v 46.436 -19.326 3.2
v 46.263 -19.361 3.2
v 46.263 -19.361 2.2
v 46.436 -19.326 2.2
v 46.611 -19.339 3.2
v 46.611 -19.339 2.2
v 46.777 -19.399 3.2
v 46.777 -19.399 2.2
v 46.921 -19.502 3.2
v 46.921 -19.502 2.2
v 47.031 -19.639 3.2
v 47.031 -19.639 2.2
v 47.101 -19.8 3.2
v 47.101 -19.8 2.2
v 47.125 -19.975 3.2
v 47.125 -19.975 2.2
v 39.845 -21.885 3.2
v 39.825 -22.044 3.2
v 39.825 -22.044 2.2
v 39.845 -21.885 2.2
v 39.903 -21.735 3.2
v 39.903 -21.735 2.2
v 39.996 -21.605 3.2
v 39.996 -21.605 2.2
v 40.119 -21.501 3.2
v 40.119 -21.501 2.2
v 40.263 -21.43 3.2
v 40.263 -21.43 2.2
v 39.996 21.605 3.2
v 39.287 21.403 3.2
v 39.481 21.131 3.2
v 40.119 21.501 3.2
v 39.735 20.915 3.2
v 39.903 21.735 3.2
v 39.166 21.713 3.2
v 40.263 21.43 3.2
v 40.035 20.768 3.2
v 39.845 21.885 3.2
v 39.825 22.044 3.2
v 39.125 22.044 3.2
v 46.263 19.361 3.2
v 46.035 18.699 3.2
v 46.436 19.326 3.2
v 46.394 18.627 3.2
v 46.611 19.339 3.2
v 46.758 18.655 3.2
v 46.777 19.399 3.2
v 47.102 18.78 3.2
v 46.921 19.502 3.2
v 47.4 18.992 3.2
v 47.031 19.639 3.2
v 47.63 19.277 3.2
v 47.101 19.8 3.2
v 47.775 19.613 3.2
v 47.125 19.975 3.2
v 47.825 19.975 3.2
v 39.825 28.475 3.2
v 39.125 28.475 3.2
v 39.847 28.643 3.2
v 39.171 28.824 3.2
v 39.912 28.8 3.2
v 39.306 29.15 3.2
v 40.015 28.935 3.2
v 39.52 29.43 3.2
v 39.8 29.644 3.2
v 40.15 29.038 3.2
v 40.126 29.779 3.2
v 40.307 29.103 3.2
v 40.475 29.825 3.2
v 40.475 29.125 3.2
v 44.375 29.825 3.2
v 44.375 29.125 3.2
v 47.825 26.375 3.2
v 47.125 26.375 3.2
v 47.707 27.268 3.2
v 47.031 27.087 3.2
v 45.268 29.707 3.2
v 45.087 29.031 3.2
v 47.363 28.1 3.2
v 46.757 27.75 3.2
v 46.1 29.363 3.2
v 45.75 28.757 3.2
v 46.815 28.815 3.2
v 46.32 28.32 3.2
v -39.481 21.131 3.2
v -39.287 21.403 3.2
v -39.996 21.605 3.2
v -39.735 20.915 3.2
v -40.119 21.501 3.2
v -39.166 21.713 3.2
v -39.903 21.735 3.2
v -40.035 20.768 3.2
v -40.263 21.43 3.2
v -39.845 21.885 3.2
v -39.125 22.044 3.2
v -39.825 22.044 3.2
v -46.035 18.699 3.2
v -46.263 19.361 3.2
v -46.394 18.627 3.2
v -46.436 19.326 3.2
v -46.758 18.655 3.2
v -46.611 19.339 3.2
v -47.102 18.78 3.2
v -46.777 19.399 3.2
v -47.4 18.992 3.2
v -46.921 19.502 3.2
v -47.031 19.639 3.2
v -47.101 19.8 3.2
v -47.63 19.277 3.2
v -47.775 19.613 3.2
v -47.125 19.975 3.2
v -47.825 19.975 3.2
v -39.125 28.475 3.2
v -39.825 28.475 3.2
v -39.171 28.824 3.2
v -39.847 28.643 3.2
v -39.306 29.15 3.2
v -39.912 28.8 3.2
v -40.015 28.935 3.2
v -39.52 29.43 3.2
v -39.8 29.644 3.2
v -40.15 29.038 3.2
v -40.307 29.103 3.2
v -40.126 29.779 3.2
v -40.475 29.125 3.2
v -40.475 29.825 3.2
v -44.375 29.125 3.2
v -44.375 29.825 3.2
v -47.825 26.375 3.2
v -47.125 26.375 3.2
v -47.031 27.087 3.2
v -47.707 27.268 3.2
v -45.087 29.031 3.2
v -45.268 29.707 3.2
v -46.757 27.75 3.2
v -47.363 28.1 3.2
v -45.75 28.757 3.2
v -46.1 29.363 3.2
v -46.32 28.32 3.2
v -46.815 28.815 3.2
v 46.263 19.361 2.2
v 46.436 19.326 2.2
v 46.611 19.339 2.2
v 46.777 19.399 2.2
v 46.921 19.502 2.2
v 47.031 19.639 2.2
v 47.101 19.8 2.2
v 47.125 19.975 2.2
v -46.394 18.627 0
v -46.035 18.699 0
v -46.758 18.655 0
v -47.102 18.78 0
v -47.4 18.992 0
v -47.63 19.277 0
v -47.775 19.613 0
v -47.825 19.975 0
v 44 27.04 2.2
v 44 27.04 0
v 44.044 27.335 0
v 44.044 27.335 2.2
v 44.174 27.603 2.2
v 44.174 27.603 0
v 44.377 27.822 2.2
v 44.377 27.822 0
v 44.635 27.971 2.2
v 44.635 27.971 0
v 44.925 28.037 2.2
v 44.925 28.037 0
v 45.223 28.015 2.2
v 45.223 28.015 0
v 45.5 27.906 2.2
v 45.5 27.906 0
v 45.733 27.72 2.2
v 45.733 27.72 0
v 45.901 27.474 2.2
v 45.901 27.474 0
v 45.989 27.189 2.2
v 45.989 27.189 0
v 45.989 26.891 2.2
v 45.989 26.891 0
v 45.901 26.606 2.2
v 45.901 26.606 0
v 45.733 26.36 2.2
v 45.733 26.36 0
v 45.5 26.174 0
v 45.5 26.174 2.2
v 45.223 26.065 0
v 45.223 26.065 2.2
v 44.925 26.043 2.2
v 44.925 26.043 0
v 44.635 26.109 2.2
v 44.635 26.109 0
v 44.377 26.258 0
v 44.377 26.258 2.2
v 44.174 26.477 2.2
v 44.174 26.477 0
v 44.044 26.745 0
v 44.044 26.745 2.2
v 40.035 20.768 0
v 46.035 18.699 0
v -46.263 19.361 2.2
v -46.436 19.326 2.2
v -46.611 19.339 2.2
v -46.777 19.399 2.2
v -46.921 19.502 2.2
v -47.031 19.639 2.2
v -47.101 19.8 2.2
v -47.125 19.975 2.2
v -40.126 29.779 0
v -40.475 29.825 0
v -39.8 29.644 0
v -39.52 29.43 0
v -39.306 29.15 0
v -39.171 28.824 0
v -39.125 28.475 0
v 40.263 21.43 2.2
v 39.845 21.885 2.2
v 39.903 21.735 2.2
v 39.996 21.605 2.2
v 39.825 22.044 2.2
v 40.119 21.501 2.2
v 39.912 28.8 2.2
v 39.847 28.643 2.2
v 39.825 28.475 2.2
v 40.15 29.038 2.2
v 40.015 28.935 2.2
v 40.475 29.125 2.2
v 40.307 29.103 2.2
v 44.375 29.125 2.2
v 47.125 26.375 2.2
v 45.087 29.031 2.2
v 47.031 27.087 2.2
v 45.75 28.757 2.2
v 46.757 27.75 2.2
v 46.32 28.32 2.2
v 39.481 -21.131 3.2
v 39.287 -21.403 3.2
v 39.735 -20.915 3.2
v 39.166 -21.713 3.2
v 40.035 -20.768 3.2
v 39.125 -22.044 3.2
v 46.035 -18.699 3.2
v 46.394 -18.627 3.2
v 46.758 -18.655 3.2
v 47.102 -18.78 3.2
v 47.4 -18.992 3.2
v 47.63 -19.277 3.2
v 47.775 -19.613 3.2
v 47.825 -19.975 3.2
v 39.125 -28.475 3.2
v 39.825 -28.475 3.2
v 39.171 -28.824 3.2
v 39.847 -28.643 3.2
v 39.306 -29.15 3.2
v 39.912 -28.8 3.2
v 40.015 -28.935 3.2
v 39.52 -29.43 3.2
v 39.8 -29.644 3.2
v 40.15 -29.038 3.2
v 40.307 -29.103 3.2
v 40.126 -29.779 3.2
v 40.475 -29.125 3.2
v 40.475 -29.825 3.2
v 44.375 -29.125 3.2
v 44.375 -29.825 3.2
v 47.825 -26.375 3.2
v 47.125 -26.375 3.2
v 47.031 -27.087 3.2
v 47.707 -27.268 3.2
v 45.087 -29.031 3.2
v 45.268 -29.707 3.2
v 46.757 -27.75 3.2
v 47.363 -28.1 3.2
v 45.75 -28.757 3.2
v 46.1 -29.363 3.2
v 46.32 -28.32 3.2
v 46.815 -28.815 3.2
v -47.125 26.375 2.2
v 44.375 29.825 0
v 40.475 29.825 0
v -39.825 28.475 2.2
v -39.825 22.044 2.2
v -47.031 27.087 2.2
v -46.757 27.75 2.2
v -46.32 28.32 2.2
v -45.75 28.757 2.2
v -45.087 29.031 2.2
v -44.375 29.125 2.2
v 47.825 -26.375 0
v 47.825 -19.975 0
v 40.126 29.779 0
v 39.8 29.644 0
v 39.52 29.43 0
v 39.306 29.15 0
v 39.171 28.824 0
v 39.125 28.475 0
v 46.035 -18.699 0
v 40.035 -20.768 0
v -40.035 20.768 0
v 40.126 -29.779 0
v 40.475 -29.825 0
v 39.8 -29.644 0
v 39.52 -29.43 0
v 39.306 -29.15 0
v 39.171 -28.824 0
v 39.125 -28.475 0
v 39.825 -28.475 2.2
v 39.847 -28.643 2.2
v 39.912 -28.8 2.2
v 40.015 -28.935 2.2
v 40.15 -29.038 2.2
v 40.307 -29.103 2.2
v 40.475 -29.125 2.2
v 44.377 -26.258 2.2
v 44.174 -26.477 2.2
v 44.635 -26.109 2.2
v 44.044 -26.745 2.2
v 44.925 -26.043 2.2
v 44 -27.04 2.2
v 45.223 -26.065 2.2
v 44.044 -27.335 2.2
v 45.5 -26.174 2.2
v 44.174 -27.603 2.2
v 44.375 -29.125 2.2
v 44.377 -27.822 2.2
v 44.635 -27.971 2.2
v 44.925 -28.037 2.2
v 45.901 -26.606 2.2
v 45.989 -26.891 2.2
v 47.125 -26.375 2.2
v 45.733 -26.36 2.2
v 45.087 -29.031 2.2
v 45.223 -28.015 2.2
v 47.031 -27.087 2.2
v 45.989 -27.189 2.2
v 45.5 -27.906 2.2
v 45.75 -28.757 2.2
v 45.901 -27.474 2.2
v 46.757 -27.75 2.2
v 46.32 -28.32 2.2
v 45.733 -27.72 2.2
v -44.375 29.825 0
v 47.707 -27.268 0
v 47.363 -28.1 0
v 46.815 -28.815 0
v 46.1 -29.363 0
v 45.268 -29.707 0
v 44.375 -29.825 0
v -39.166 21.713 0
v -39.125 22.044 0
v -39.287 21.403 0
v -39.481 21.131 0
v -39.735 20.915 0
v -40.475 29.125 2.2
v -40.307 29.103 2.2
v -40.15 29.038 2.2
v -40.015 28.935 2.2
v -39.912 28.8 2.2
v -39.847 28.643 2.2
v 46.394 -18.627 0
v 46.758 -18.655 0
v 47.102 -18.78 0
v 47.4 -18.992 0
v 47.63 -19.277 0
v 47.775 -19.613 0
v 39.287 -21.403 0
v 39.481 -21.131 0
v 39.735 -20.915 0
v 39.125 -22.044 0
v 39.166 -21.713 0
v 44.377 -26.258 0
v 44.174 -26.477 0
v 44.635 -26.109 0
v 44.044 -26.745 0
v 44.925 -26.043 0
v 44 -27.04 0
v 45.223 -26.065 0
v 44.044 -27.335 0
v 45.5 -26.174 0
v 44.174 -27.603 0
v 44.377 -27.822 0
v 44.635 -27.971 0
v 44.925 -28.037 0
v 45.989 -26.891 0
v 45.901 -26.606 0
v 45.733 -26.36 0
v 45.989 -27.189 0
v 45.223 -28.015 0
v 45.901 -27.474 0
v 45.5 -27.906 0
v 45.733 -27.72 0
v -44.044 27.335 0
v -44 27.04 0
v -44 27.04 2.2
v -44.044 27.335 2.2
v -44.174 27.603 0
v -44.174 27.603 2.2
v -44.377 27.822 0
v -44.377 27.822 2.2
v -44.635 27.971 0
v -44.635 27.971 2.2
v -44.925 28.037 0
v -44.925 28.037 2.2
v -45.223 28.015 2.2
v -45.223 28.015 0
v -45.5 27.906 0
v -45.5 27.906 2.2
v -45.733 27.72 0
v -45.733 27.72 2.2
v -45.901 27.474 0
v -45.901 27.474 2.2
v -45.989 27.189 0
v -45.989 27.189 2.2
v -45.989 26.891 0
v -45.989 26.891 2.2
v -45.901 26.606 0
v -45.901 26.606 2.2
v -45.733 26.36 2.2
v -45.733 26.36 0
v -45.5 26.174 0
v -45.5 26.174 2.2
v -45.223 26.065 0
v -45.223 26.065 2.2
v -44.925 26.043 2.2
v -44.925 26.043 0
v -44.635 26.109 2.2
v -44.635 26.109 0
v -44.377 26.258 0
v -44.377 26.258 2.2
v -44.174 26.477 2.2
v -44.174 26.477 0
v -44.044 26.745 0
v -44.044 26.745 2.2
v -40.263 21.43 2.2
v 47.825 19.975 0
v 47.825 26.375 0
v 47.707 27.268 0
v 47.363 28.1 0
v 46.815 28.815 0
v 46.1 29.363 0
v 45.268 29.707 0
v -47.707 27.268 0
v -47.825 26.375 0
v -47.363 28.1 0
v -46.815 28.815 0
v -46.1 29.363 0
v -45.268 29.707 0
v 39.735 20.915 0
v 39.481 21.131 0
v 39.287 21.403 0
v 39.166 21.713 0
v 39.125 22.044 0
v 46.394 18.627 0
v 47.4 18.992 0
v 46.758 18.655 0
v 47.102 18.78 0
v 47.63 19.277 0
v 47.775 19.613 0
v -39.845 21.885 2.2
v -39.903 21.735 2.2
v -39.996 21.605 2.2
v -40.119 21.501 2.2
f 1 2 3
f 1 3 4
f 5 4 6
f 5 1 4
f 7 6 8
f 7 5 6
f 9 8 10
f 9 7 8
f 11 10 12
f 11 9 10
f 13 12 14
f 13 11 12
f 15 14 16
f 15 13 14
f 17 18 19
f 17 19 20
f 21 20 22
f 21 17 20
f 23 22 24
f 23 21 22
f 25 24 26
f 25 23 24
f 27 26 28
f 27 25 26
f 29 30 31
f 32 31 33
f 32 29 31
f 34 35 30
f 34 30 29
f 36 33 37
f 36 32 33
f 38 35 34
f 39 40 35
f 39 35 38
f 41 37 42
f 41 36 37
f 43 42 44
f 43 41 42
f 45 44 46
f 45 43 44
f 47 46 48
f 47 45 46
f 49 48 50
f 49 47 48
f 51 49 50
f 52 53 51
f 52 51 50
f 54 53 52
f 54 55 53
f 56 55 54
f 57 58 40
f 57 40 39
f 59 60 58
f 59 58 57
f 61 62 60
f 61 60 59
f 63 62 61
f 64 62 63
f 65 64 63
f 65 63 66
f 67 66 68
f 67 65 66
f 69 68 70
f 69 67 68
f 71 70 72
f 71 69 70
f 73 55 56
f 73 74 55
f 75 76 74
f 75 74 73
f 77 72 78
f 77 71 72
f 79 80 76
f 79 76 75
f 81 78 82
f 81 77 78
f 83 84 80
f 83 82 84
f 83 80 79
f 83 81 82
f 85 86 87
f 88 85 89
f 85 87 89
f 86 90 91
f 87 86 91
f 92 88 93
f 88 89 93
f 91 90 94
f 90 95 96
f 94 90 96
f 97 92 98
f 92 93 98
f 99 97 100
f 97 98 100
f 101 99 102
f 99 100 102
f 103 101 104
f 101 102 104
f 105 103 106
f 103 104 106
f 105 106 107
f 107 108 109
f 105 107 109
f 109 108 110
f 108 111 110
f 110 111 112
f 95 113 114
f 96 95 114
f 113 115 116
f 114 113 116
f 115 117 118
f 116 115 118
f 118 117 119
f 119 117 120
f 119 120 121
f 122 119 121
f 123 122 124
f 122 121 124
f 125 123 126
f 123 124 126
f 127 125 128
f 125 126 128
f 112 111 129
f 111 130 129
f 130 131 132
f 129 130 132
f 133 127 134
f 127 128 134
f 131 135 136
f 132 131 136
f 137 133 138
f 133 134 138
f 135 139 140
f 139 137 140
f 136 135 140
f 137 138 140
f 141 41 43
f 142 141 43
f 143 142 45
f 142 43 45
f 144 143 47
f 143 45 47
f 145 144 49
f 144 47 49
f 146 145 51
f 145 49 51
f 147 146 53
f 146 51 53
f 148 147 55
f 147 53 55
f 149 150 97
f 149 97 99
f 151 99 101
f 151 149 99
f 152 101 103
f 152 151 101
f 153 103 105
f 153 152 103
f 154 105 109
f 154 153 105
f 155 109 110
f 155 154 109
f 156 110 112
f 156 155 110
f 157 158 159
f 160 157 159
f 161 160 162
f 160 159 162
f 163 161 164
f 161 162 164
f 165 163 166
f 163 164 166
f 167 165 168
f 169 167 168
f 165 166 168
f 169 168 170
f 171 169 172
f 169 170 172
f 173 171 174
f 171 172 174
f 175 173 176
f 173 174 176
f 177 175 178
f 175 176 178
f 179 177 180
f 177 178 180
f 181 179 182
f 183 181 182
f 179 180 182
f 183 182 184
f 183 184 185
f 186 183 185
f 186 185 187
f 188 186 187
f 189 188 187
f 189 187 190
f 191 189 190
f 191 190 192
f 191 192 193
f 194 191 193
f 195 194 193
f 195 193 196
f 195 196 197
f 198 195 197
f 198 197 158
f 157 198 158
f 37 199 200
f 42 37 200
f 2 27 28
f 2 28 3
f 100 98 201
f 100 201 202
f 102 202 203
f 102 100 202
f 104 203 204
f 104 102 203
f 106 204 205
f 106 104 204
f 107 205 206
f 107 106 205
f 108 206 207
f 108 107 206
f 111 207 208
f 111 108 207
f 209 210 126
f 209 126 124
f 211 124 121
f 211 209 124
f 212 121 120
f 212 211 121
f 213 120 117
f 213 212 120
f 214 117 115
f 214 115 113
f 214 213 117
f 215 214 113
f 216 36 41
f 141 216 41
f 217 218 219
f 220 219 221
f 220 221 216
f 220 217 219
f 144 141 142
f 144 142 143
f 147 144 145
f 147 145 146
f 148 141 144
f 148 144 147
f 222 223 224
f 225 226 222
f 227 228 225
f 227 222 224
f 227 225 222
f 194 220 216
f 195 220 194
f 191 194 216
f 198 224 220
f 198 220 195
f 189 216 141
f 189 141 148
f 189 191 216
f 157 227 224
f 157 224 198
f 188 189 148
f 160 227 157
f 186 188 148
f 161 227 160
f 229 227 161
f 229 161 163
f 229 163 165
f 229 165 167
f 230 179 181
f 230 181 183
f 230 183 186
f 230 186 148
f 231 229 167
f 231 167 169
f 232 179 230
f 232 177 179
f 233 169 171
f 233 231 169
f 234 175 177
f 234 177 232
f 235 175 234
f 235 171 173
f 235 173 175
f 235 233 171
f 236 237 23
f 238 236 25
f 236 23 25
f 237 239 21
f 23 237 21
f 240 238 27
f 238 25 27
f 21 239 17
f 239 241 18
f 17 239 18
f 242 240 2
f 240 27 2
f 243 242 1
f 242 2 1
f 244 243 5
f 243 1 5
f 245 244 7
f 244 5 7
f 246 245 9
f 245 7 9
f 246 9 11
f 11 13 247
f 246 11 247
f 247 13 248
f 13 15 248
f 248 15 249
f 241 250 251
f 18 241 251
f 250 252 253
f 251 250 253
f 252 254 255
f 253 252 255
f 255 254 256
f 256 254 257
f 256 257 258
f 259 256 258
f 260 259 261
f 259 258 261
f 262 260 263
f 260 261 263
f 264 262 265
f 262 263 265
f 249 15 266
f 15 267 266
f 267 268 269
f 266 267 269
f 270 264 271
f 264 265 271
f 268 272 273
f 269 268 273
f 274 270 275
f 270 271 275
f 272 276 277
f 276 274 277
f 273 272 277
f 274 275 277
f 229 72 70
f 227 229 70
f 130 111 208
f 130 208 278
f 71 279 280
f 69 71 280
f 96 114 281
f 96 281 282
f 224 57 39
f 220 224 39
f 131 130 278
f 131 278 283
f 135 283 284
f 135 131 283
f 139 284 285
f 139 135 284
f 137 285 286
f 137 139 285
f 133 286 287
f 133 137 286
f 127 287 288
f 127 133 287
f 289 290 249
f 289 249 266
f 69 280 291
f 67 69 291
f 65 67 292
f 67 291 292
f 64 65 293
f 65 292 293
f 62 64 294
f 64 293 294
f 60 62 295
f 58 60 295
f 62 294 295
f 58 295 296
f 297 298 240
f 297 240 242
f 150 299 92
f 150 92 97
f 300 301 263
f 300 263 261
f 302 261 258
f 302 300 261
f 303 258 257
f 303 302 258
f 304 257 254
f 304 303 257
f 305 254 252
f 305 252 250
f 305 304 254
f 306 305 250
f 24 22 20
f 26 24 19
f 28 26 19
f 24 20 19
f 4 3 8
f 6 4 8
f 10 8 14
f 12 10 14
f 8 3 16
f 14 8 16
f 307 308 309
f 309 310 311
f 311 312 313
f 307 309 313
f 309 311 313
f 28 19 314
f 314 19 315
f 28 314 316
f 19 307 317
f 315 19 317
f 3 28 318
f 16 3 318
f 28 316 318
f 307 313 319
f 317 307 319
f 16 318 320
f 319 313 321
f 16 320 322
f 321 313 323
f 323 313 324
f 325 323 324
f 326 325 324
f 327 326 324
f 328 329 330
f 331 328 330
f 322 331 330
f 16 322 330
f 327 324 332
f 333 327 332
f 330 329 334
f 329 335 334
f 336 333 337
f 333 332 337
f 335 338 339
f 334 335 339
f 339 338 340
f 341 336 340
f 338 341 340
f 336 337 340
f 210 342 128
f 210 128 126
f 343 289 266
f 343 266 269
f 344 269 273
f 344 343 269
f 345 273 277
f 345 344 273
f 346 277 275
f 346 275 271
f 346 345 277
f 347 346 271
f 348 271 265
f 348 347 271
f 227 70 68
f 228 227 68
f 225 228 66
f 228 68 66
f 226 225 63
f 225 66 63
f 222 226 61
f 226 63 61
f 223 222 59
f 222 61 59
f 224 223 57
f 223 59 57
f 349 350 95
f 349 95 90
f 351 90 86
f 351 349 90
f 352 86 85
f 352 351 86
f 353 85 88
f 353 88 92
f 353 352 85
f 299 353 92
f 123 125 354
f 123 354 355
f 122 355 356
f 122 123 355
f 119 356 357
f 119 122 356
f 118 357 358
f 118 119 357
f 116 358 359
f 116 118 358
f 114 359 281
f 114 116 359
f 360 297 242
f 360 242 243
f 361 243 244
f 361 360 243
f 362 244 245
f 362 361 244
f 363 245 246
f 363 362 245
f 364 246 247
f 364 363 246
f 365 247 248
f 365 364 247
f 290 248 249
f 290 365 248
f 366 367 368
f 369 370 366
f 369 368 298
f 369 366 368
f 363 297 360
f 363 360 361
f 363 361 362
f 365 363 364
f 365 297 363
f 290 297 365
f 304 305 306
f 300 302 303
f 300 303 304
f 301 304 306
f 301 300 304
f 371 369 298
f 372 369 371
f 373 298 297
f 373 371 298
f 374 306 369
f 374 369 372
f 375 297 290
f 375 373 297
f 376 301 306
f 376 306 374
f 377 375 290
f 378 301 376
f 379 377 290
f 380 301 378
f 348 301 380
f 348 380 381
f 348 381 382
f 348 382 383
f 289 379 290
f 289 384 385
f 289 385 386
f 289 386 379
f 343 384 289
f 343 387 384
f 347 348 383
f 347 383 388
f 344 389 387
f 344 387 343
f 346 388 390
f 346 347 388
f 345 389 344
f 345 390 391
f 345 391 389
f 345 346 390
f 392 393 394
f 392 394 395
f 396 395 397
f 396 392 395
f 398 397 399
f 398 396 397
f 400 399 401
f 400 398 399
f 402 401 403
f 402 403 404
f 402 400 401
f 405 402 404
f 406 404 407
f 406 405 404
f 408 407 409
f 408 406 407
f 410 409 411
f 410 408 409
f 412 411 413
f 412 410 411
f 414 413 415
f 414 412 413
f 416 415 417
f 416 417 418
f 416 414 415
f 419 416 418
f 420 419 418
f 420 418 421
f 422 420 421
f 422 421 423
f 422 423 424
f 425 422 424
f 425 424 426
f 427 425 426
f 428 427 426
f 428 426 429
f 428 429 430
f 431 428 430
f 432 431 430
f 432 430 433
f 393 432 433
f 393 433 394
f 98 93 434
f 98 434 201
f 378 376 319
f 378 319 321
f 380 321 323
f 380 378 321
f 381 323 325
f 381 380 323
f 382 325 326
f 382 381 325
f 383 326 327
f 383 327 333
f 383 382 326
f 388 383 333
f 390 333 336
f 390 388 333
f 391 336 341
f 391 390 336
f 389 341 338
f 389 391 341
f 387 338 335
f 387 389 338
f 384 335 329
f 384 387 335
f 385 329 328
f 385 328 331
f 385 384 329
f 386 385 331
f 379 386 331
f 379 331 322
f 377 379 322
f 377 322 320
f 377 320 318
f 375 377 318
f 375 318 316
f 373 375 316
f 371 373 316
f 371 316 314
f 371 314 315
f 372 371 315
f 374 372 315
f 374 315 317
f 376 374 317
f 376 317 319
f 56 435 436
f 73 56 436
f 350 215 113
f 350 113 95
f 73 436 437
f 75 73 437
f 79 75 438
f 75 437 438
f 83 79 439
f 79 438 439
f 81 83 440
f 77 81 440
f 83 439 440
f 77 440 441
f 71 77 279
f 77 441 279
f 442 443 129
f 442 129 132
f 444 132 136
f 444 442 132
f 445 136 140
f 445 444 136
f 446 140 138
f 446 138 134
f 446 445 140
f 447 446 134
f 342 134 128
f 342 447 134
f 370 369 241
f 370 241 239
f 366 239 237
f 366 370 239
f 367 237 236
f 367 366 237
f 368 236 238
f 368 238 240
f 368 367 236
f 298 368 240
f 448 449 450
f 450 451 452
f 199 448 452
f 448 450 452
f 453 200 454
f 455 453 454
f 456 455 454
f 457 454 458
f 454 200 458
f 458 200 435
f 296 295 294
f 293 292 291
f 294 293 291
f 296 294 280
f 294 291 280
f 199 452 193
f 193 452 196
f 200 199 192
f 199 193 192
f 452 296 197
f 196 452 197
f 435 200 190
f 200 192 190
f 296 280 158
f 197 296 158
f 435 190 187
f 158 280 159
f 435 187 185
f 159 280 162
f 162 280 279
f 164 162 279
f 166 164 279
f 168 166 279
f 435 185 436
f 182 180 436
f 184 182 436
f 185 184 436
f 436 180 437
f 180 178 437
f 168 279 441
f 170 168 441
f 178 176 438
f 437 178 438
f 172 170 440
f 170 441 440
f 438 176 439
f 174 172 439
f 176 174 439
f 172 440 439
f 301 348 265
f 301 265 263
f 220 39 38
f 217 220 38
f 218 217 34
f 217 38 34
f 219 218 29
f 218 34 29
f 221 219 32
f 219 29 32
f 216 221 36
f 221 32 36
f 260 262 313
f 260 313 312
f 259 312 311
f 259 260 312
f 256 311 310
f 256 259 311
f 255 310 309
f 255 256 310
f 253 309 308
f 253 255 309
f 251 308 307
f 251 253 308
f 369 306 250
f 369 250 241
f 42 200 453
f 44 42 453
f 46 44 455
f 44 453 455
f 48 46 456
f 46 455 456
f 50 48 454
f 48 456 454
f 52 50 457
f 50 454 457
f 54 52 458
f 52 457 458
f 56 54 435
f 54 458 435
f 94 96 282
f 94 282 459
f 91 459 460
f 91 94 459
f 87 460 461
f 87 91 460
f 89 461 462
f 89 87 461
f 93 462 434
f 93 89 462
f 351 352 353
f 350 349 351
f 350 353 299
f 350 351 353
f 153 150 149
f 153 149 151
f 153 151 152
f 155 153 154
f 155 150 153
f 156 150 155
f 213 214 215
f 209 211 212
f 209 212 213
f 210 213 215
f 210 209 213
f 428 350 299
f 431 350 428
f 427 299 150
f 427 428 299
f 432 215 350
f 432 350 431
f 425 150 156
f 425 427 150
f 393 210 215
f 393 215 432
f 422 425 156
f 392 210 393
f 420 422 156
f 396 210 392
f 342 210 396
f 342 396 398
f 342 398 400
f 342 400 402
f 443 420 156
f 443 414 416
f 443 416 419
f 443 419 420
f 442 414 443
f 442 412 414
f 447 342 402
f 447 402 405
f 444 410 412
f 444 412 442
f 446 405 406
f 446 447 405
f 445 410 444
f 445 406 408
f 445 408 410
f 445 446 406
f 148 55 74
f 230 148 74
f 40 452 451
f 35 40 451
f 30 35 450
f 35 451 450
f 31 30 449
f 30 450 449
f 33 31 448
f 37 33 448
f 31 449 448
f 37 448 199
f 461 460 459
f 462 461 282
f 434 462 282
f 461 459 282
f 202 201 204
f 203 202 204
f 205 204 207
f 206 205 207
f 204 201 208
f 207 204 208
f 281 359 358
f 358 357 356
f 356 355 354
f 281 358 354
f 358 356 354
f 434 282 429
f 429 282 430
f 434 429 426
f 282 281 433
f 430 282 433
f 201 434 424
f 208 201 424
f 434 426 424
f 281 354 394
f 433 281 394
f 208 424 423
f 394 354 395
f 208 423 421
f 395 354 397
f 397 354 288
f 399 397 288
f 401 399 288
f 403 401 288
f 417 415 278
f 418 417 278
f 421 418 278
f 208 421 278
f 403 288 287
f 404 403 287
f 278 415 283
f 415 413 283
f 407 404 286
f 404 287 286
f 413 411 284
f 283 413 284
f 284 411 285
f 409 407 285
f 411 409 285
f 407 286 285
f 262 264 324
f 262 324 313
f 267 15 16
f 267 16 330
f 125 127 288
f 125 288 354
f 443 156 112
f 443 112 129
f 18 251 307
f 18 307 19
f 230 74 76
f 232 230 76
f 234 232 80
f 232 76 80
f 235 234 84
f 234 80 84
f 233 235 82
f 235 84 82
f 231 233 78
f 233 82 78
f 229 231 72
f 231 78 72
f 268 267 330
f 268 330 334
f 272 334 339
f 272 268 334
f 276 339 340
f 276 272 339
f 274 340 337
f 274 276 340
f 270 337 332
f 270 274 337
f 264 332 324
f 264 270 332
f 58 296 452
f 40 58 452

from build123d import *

# Parameters (mm, degrees)
BOSS_EXTRUDE1_DEPTH = 3.2
CUT_EXTRUDE1_DEPTH  = 1
SKETCH4_R           = 1
CUT_EXTRUDE2_DEPTH  = 57.453531776


with BuildPart() as part:
    # Sketch1 → Boss-Extrude1 (new body)
    with BuildSketch(Plane.XY):
        with BuildLine():
            Line((47.825, 19.975), (47.825, 26.375))
            ThreePointArc((47.825, 26.375), (46.814518395, 28.814518395), (44.375, 29.825))
            Line((44.375, 29.825), (40.475, 29.825))
            ThreePointArc((40.475, 29.825), (39.520405845, 29.429594155), (39.125, 28.475))
            Line((39.125, 28.475), (39.125, 22.044366415))
            ThreePointArc((39.125, 22.044366415), (39.375745502, 21.260695854), (40.034836368, 20.768139171))
            Line((40.034836368, 20.768139171), (46.034836368, 18.698772757))
            ThreePointArc((46.034836368, 18.698772757), (47.258670561, 18.875745502), (47.825, 19.975))
        make_face()
    extrude(amount=BOSS_EXTRUDE1_DEPTH)

    # Sketch2 → Cut-Extrude1 (cut)
    with BuildSketch(Plane.XY.offset(3.2)):
        with BuildLine():
            Line((40.263069362, 21.429886631), (46.263069362, 19.360520216))
            ThreePointArc((46.263069362, 19.360520216), (46.852322863, 19.445729316), (47.125, 19.975))
            Line((47.125, 19.975), (47.125, 26.375))
            ThreePointArc((47.125, 26.375), (46.319543648, 28.319543648), (44.375, 29.125))
            Line((44.375, 29.125), (40.475, 29.125))
            ThreePointArc((40.475, 29.125), (40.015380592, 28.934619408), (39.825, 28.475))
            Line((39.825, 28.475), (39.825, 22.044366415))
            ThreePointArc((39.825, 22.044366415), (39.945729316, 21.667043552), (40.263069362, 21.429886631))
        make_face()
    extrude(amount=-CUT_EXTRUDE1_DEPTH, mode=Mode.SUBTRACT)

    # Sketch4 → Cut-Extrude2 (cut, through all)
    with BuildSketch(Plane(origin=(0, 0, 0), x_dir=(-1, 0, 0), z_dir=(0, 0, -1))):
        with Locations((-45, 27.04)):
            Circle(SKETCH4_R)
    extrude(amount=-CUT_EXTRUDE2_DEPTH, mode=Mode.SUBTRACT)


with BuildPart() as body_2:
    # Mirror2: mirrored copy
    add(part.part.mirror(Plane.ZX))


with BuildPart() as body_3:
    # Mirror3: mirrored copy
    add(part.part.mirror(Plane(origin=(0, 0, 0), x_dir=(0, 0, 1), z_dir=(1, 0, 0))))


solid = Compound([part.part, body_2.part, body_3.part])
